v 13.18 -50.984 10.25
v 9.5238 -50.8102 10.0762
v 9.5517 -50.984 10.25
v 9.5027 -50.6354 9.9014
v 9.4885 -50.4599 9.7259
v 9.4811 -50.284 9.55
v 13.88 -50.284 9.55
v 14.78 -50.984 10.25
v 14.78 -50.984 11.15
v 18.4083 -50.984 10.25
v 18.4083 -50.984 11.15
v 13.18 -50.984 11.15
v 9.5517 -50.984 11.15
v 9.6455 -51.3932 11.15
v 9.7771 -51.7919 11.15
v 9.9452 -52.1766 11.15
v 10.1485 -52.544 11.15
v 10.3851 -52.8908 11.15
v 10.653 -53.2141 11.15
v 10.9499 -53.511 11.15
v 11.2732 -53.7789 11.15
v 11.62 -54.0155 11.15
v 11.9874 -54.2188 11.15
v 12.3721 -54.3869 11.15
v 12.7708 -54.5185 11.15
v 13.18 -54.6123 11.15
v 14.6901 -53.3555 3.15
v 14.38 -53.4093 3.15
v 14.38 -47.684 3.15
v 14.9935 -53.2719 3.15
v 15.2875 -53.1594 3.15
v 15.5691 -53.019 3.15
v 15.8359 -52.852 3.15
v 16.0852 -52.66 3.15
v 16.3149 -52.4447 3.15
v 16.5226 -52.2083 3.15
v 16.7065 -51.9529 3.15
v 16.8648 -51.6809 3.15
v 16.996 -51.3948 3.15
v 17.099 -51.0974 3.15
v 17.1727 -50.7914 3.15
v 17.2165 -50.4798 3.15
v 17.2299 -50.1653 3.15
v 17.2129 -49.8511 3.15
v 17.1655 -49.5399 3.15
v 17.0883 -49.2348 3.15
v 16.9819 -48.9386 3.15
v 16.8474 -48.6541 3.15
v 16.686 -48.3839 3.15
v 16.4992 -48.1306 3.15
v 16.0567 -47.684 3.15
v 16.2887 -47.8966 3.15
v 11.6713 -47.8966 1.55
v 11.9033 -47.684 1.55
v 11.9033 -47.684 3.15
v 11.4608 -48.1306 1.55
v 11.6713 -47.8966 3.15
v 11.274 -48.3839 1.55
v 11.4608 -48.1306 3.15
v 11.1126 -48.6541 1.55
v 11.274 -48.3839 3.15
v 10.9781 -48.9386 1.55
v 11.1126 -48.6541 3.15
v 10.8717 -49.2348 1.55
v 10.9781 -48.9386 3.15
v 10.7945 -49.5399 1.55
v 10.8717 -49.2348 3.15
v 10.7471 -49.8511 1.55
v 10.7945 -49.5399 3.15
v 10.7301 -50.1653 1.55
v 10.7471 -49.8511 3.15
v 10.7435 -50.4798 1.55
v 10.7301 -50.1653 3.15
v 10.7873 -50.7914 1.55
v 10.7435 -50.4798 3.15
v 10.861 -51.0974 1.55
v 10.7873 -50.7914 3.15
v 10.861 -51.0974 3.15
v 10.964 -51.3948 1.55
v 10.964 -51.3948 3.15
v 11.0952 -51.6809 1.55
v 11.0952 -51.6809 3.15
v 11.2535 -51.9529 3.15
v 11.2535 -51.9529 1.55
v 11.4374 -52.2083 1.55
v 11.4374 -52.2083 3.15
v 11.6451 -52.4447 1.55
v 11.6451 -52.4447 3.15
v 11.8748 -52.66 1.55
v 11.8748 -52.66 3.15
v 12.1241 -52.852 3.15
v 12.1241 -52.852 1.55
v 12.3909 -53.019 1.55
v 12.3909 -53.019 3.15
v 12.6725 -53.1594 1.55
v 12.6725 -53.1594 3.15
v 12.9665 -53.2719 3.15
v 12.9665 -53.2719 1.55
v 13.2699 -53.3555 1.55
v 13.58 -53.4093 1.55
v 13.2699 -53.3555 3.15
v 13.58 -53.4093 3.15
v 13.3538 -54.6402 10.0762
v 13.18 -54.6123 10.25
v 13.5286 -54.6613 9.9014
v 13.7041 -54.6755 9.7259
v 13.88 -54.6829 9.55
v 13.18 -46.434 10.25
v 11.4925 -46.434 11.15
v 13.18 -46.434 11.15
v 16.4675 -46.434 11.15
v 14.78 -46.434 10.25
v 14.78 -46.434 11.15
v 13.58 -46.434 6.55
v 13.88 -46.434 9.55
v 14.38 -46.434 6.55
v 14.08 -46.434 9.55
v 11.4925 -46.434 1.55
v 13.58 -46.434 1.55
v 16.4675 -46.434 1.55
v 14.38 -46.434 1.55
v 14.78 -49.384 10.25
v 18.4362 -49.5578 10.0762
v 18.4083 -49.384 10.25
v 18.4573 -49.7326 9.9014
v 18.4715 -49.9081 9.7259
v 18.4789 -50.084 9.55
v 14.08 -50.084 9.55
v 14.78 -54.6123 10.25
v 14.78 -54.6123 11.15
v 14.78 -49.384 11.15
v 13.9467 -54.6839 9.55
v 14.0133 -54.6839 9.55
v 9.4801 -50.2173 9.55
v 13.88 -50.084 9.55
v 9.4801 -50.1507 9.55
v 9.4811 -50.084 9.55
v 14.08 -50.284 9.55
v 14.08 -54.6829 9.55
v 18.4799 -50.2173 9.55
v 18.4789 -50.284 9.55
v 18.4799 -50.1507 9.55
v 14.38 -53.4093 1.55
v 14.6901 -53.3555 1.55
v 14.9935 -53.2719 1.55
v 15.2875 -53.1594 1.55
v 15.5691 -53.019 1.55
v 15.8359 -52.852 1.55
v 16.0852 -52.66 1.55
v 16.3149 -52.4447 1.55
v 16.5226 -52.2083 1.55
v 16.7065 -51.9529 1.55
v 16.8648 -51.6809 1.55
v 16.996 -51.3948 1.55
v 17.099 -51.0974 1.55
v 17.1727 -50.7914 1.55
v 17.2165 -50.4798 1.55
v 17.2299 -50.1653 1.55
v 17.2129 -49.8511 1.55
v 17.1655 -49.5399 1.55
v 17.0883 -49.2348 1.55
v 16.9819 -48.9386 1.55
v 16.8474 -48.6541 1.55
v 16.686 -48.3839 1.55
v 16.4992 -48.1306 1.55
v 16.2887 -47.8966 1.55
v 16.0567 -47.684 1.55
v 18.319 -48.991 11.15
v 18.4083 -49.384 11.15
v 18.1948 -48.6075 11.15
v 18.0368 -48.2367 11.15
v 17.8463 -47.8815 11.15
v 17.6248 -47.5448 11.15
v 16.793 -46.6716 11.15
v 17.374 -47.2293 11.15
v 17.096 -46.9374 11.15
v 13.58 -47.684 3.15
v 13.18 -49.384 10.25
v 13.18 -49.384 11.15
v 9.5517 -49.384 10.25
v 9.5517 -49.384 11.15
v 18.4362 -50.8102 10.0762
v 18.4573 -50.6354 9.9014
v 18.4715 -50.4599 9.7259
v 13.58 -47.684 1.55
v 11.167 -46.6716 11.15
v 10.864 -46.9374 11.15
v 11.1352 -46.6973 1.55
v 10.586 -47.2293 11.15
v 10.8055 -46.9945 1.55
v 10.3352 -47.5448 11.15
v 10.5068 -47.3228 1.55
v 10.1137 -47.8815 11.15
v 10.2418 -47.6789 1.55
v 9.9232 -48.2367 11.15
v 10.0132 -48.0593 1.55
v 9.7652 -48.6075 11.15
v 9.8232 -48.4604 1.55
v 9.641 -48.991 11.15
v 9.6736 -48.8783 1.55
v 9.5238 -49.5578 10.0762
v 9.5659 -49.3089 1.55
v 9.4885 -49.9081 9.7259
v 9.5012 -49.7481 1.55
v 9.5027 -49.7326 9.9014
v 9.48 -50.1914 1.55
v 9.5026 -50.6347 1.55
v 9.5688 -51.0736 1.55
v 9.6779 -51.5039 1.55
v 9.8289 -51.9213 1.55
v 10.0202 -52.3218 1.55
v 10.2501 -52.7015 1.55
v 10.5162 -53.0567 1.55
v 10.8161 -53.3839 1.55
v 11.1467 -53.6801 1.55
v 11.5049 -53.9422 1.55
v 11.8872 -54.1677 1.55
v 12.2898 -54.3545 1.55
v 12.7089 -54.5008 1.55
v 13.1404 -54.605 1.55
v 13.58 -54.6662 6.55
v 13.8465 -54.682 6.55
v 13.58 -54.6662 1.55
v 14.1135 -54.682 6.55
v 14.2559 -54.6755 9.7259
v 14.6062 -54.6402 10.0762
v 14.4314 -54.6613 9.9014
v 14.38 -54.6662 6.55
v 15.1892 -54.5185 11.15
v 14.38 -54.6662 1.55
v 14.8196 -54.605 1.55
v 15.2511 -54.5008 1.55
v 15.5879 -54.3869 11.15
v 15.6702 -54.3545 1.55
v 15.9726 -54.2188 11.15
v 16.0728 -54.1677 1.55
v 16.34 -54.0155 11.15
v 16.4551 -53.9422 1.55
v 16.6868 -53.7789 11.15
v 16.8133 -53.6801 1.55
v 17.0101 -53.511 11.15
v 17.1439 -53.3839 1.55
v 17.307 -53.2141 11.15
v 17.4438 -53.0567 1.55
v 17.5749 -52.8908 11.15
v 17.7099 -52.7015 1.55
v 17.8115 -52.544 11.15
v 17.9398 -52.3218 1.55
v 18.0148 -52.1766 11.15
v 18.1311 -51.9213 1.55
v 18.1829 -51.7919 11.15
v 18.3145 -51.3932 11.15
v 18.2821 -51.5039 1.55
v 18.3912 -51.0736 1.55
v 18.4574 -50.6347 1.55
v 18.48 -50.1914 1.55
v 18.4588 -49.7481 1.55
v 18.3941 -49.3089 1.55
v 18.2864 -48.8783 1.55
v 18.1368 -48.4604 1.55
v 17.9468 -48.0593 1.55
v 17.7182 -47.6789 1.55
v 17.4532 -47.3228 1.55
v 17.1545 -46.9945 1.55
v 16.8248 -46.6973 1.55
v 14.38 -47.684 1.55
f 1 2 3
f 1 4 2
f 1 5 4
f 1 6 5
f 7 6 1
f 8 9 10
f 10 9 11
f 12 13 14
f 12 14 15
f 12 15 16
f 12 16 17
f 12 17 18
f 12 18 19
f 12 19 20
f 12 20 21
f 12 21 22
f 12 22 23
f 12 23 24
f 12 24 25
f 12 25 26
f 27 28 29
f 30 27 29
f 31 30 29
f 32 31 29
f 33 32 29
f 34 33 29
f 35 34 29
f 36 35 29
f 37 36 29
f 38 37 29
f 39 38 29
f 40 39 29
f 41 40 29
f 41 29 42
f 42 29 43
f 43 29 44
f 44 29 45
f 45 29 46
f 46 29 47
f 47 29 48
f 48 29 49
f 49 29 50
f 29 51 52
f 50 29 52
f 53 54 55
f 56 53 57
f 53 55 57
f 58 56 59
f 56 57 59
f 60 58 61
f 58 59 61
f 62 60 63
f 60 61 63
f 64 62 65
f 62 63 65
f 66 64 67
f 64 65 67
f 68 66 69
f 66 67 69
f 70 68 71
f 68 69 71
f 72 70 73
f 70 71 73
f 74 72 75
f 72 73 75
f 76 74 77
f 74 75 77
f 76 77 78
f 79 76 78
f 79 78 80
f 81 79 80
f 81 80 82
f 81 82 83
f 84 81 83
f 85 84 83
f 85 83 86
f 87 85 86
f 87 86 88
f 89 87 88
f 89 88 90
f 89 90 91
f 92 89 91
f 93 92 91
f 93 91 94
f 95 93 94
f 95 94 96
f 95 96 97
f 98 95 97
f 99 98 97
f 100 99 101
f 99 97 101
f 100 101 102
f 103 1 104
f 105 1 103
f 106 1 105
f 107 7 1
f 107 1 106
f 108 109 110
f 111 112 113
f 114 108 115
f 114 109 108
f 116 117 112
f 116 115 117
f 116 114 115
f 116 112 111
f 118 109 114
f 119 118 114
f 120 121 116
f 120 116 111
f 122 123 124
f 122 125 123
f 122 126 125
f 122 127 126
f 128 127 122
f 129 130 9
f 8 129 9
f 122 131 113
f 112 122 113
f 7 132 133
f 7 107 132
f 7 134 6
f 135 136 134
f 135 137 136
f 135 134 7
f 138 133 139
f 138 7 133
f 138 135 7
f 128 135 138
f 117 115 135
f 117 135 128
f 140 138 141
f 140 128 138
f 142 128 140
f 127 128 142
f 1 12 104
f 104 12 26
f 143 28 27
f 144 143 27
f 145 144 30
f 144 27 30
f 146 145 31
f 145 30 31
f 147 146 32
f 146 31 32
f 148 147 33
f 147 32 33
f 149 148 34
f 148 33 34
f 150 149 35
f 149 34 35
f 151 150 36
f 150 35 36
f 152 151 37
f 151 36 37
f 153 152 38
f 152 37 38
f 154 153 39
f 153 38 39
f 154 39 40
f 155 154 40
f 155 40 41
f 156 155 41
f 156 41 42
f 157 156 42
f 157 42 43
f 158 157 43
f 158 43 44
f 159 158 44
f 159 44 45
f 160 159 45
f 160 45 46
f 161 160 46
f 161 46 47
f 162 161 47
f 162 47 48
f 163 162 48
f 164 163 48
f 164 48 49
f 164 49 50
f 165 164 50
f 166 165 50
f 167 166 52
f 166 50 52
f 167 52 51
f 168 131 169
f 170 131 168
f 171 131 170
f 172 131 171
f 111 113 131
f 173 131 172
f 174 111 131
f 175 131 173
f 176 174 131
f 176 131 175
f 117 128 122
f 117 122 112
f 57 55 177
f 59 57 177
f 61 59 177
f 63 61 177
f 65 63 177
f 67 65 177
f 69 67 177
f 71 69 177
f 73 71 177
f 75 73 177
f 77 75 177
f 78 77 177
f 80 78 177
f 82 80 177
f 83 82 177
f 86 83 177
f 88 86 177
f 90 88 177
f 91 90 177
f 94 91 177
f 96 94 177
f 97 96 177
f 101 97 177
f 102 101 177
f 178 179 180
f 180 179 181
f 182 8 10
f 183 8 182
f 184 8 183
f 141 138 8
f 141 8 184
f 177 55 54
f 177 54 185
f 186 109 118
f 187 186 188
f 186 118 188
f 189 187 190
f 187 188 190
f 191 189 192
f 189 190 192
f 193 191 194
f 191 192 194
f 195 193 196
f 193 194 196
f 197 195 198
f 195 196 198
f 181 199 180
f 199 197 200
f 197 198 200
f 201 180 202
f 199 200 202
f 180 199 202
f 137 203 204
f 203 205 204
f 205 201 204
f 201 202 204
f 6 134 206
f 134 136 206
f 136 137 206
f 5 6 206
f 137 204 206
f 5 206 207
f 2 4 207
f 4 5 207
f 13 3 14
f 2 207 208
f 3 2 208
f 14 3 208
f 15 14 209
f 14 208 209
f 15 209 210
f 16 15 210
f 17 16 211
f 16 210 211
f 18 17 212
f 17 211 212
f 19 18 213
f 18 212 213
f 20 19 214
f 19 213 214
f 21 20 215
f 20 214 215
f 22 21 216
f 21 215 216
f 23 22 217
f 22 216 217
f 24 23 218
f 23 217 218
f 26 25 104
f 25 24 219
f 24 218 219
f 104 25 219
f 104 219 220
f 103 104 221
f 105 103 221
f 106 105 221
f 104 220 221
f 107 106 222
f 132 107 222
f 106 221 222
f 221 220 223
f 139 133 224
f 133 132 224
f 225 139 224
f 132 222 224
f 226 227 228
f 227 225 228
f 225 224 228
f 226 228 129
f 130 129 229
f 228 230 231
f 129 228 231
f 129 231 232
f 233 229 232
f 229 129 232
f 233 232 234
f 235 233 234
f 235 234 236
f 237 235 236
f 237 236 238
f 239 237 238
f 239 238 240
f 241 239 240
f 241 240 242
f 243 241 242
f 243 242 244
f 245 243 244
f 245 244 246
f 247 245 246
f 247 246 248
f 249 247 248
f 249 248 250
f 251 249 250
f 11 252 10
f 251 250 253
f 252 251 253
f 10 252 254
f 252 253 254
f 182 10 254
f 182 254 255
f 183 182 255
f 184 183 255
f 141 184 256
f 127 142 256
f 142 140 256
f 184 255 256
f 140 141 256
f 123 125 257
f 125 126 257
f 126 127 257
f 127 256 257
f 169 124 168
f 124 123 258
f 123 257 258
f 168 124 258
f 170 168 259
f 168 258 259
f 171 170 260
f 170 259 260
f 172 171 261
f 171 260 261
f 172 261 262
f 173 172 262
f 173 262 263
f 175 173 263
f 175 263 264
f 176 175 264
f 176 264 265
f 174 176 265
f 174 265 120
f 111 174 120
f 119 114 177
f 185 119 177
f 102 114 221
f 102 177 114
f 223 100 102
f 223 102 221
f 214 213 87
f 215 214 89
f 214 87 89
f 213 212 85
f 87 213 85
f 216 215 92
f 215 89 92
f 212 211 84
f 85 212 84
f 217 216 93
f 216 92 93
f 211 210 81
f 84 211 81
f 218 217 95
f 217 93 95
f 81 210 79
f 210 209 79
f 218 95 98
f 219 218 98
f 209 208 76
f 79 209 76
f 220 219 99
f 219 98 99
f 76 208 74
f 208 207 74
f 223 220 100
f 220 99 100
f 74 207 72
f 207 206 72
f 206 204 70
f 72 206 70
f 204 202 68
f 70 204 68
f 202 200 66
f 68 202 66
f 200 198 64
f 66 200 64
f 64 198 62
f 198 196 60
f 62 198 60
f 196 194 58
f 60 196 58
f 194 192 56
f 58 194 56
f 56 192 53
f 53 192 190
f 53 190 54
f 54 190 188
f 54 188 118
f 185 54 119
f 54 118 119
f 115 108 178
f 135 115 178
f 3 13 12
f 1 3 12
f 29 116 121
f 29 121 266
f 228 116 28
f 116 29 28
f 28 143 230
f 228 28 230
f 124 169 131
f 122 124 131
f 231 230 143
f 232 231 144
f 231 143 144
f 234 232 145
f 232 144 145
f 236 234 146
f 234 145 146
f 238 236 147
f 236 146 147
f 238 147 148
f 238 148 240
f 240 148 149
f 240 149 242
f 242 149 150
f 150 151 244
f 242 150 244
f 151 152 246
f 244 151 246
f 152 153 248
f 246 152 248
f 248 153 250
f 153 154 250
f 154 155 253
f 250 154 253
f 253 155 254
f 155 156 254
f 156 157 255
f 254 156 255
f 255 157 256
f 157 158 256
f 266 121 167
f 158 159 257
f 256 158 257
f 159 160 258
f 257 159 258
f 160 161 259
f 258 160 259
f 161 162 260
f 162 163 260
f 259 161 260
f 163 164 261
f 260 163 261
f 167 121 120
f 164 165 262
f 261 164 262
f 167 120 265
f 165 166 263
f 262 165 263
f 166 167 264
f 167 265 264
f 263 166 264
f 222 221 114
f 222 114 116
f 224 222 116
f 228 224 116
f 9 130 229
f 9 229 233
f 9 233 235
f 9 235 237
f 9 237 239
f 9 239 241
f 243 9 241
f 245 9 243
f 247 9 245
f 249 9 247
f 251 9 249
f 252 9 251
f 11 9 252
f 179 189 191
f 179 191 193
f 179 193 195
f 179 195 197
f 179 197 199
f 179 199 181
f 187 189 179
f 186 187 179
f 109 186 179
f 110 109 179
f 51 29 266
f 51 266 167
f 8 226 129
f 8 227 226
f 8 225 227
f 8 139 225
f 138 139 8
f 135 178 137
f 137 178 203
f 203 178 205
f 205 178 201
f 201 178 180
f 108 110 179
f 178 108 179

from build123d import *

# Parameters (mm, degrees)
PAD_DEPTH       = 1.6
PAD019_DEPTH    = 8
POCKET018_DEPTH = 1.6
CHAMFER_SIZE    = 0.7
SKETCH034_W     = 0.8
SKETCH034_H     = 9
POCKET019_DEPTH = 5


with BuildPart() as part:
    # Sketch031 → Pad (new body)
    with BuildSketch(Plane.XY.offset(3.15)):
        with BuildLine():
            ThreePointArc((11.492531, -46.434), (13.98, -54.684), (16.467469, -46.434))
            Line((11.492531, -46.434), (16.467469, -46.434))
        make_face()
        with BuildLine():
            ThreePointArc((11.903344, -47.684), (13.98, -53.434), (16.056656, -47.684))
            Line((11.903344, -47.684), (16.056656, -47.684))
        make_face(mode=Mode.SUBTRACT)
    extrude(amount=-PAD_DEPTH)

    # Sketch032 → Pad019 (join)
    with BuildSketch(Plane.XY.offset(3.15)):
        with BuildLine():
            ThreePointArc((11.492531, -46.434), (13.98, -54.684), (16.467469, -46.434))
            Line((11.492531, -46.434), (16.467469, -46.434))
        make_face()
    extrude(amount=PAD019_DEPTH)

    # Sketch033 → Pocket018 (cut)
    with BuildSketch(Plane.XY.offset(11.15)):
        Polygon((14.78, -54.684), (14.78, -50.984), (18.48, -50.984), (18.48, -49.384), (14.78, -49.384), (14.78, -45.684), (13.18, -45.684), (13.18, -49.384), (9.48, -49.384), (9.48, -50.984), (13.18, -50.984), (13.18, -54.684), align=None)
    extrude(amount=-POCKET018_DEPTH, mode=Mode.SUBTRACT)

    # Chamfer
    chamfer_edges = [part.edges().sort_by_distance(p)[0] for p in [
        (16.594159, -50.984, 9.55),
        (14.78, -47.909, 9.55),
        (13.18, -47.909, 9.55),
        (11.365841, -50.984, 9.55),
        (11.365841, -49.384, 9.55),
        (13.18, -52.798159, 9.55),
        (16.594159, -49.384, 9.55),
        (14.78, -52.798159, 9.55),
    ]]
    chamfer(chamfer_edges, length=CHAMFER_SIZE)

    # Sketch034 → Pocket019 (cut)
    with BuildSketch(Plane(origin=(0, 0, 1.55), x_dir=(1, 0, 0), z_dir=(0, 0, -1))):
        with Locations((13.98, 50.184)):
            Rectangle(SKETCH034_W, SKETCH034_H)
    extrude(amount=-POCKET019_DEPTH, mode=Mode.SUBTRACT)


solid = part.part
